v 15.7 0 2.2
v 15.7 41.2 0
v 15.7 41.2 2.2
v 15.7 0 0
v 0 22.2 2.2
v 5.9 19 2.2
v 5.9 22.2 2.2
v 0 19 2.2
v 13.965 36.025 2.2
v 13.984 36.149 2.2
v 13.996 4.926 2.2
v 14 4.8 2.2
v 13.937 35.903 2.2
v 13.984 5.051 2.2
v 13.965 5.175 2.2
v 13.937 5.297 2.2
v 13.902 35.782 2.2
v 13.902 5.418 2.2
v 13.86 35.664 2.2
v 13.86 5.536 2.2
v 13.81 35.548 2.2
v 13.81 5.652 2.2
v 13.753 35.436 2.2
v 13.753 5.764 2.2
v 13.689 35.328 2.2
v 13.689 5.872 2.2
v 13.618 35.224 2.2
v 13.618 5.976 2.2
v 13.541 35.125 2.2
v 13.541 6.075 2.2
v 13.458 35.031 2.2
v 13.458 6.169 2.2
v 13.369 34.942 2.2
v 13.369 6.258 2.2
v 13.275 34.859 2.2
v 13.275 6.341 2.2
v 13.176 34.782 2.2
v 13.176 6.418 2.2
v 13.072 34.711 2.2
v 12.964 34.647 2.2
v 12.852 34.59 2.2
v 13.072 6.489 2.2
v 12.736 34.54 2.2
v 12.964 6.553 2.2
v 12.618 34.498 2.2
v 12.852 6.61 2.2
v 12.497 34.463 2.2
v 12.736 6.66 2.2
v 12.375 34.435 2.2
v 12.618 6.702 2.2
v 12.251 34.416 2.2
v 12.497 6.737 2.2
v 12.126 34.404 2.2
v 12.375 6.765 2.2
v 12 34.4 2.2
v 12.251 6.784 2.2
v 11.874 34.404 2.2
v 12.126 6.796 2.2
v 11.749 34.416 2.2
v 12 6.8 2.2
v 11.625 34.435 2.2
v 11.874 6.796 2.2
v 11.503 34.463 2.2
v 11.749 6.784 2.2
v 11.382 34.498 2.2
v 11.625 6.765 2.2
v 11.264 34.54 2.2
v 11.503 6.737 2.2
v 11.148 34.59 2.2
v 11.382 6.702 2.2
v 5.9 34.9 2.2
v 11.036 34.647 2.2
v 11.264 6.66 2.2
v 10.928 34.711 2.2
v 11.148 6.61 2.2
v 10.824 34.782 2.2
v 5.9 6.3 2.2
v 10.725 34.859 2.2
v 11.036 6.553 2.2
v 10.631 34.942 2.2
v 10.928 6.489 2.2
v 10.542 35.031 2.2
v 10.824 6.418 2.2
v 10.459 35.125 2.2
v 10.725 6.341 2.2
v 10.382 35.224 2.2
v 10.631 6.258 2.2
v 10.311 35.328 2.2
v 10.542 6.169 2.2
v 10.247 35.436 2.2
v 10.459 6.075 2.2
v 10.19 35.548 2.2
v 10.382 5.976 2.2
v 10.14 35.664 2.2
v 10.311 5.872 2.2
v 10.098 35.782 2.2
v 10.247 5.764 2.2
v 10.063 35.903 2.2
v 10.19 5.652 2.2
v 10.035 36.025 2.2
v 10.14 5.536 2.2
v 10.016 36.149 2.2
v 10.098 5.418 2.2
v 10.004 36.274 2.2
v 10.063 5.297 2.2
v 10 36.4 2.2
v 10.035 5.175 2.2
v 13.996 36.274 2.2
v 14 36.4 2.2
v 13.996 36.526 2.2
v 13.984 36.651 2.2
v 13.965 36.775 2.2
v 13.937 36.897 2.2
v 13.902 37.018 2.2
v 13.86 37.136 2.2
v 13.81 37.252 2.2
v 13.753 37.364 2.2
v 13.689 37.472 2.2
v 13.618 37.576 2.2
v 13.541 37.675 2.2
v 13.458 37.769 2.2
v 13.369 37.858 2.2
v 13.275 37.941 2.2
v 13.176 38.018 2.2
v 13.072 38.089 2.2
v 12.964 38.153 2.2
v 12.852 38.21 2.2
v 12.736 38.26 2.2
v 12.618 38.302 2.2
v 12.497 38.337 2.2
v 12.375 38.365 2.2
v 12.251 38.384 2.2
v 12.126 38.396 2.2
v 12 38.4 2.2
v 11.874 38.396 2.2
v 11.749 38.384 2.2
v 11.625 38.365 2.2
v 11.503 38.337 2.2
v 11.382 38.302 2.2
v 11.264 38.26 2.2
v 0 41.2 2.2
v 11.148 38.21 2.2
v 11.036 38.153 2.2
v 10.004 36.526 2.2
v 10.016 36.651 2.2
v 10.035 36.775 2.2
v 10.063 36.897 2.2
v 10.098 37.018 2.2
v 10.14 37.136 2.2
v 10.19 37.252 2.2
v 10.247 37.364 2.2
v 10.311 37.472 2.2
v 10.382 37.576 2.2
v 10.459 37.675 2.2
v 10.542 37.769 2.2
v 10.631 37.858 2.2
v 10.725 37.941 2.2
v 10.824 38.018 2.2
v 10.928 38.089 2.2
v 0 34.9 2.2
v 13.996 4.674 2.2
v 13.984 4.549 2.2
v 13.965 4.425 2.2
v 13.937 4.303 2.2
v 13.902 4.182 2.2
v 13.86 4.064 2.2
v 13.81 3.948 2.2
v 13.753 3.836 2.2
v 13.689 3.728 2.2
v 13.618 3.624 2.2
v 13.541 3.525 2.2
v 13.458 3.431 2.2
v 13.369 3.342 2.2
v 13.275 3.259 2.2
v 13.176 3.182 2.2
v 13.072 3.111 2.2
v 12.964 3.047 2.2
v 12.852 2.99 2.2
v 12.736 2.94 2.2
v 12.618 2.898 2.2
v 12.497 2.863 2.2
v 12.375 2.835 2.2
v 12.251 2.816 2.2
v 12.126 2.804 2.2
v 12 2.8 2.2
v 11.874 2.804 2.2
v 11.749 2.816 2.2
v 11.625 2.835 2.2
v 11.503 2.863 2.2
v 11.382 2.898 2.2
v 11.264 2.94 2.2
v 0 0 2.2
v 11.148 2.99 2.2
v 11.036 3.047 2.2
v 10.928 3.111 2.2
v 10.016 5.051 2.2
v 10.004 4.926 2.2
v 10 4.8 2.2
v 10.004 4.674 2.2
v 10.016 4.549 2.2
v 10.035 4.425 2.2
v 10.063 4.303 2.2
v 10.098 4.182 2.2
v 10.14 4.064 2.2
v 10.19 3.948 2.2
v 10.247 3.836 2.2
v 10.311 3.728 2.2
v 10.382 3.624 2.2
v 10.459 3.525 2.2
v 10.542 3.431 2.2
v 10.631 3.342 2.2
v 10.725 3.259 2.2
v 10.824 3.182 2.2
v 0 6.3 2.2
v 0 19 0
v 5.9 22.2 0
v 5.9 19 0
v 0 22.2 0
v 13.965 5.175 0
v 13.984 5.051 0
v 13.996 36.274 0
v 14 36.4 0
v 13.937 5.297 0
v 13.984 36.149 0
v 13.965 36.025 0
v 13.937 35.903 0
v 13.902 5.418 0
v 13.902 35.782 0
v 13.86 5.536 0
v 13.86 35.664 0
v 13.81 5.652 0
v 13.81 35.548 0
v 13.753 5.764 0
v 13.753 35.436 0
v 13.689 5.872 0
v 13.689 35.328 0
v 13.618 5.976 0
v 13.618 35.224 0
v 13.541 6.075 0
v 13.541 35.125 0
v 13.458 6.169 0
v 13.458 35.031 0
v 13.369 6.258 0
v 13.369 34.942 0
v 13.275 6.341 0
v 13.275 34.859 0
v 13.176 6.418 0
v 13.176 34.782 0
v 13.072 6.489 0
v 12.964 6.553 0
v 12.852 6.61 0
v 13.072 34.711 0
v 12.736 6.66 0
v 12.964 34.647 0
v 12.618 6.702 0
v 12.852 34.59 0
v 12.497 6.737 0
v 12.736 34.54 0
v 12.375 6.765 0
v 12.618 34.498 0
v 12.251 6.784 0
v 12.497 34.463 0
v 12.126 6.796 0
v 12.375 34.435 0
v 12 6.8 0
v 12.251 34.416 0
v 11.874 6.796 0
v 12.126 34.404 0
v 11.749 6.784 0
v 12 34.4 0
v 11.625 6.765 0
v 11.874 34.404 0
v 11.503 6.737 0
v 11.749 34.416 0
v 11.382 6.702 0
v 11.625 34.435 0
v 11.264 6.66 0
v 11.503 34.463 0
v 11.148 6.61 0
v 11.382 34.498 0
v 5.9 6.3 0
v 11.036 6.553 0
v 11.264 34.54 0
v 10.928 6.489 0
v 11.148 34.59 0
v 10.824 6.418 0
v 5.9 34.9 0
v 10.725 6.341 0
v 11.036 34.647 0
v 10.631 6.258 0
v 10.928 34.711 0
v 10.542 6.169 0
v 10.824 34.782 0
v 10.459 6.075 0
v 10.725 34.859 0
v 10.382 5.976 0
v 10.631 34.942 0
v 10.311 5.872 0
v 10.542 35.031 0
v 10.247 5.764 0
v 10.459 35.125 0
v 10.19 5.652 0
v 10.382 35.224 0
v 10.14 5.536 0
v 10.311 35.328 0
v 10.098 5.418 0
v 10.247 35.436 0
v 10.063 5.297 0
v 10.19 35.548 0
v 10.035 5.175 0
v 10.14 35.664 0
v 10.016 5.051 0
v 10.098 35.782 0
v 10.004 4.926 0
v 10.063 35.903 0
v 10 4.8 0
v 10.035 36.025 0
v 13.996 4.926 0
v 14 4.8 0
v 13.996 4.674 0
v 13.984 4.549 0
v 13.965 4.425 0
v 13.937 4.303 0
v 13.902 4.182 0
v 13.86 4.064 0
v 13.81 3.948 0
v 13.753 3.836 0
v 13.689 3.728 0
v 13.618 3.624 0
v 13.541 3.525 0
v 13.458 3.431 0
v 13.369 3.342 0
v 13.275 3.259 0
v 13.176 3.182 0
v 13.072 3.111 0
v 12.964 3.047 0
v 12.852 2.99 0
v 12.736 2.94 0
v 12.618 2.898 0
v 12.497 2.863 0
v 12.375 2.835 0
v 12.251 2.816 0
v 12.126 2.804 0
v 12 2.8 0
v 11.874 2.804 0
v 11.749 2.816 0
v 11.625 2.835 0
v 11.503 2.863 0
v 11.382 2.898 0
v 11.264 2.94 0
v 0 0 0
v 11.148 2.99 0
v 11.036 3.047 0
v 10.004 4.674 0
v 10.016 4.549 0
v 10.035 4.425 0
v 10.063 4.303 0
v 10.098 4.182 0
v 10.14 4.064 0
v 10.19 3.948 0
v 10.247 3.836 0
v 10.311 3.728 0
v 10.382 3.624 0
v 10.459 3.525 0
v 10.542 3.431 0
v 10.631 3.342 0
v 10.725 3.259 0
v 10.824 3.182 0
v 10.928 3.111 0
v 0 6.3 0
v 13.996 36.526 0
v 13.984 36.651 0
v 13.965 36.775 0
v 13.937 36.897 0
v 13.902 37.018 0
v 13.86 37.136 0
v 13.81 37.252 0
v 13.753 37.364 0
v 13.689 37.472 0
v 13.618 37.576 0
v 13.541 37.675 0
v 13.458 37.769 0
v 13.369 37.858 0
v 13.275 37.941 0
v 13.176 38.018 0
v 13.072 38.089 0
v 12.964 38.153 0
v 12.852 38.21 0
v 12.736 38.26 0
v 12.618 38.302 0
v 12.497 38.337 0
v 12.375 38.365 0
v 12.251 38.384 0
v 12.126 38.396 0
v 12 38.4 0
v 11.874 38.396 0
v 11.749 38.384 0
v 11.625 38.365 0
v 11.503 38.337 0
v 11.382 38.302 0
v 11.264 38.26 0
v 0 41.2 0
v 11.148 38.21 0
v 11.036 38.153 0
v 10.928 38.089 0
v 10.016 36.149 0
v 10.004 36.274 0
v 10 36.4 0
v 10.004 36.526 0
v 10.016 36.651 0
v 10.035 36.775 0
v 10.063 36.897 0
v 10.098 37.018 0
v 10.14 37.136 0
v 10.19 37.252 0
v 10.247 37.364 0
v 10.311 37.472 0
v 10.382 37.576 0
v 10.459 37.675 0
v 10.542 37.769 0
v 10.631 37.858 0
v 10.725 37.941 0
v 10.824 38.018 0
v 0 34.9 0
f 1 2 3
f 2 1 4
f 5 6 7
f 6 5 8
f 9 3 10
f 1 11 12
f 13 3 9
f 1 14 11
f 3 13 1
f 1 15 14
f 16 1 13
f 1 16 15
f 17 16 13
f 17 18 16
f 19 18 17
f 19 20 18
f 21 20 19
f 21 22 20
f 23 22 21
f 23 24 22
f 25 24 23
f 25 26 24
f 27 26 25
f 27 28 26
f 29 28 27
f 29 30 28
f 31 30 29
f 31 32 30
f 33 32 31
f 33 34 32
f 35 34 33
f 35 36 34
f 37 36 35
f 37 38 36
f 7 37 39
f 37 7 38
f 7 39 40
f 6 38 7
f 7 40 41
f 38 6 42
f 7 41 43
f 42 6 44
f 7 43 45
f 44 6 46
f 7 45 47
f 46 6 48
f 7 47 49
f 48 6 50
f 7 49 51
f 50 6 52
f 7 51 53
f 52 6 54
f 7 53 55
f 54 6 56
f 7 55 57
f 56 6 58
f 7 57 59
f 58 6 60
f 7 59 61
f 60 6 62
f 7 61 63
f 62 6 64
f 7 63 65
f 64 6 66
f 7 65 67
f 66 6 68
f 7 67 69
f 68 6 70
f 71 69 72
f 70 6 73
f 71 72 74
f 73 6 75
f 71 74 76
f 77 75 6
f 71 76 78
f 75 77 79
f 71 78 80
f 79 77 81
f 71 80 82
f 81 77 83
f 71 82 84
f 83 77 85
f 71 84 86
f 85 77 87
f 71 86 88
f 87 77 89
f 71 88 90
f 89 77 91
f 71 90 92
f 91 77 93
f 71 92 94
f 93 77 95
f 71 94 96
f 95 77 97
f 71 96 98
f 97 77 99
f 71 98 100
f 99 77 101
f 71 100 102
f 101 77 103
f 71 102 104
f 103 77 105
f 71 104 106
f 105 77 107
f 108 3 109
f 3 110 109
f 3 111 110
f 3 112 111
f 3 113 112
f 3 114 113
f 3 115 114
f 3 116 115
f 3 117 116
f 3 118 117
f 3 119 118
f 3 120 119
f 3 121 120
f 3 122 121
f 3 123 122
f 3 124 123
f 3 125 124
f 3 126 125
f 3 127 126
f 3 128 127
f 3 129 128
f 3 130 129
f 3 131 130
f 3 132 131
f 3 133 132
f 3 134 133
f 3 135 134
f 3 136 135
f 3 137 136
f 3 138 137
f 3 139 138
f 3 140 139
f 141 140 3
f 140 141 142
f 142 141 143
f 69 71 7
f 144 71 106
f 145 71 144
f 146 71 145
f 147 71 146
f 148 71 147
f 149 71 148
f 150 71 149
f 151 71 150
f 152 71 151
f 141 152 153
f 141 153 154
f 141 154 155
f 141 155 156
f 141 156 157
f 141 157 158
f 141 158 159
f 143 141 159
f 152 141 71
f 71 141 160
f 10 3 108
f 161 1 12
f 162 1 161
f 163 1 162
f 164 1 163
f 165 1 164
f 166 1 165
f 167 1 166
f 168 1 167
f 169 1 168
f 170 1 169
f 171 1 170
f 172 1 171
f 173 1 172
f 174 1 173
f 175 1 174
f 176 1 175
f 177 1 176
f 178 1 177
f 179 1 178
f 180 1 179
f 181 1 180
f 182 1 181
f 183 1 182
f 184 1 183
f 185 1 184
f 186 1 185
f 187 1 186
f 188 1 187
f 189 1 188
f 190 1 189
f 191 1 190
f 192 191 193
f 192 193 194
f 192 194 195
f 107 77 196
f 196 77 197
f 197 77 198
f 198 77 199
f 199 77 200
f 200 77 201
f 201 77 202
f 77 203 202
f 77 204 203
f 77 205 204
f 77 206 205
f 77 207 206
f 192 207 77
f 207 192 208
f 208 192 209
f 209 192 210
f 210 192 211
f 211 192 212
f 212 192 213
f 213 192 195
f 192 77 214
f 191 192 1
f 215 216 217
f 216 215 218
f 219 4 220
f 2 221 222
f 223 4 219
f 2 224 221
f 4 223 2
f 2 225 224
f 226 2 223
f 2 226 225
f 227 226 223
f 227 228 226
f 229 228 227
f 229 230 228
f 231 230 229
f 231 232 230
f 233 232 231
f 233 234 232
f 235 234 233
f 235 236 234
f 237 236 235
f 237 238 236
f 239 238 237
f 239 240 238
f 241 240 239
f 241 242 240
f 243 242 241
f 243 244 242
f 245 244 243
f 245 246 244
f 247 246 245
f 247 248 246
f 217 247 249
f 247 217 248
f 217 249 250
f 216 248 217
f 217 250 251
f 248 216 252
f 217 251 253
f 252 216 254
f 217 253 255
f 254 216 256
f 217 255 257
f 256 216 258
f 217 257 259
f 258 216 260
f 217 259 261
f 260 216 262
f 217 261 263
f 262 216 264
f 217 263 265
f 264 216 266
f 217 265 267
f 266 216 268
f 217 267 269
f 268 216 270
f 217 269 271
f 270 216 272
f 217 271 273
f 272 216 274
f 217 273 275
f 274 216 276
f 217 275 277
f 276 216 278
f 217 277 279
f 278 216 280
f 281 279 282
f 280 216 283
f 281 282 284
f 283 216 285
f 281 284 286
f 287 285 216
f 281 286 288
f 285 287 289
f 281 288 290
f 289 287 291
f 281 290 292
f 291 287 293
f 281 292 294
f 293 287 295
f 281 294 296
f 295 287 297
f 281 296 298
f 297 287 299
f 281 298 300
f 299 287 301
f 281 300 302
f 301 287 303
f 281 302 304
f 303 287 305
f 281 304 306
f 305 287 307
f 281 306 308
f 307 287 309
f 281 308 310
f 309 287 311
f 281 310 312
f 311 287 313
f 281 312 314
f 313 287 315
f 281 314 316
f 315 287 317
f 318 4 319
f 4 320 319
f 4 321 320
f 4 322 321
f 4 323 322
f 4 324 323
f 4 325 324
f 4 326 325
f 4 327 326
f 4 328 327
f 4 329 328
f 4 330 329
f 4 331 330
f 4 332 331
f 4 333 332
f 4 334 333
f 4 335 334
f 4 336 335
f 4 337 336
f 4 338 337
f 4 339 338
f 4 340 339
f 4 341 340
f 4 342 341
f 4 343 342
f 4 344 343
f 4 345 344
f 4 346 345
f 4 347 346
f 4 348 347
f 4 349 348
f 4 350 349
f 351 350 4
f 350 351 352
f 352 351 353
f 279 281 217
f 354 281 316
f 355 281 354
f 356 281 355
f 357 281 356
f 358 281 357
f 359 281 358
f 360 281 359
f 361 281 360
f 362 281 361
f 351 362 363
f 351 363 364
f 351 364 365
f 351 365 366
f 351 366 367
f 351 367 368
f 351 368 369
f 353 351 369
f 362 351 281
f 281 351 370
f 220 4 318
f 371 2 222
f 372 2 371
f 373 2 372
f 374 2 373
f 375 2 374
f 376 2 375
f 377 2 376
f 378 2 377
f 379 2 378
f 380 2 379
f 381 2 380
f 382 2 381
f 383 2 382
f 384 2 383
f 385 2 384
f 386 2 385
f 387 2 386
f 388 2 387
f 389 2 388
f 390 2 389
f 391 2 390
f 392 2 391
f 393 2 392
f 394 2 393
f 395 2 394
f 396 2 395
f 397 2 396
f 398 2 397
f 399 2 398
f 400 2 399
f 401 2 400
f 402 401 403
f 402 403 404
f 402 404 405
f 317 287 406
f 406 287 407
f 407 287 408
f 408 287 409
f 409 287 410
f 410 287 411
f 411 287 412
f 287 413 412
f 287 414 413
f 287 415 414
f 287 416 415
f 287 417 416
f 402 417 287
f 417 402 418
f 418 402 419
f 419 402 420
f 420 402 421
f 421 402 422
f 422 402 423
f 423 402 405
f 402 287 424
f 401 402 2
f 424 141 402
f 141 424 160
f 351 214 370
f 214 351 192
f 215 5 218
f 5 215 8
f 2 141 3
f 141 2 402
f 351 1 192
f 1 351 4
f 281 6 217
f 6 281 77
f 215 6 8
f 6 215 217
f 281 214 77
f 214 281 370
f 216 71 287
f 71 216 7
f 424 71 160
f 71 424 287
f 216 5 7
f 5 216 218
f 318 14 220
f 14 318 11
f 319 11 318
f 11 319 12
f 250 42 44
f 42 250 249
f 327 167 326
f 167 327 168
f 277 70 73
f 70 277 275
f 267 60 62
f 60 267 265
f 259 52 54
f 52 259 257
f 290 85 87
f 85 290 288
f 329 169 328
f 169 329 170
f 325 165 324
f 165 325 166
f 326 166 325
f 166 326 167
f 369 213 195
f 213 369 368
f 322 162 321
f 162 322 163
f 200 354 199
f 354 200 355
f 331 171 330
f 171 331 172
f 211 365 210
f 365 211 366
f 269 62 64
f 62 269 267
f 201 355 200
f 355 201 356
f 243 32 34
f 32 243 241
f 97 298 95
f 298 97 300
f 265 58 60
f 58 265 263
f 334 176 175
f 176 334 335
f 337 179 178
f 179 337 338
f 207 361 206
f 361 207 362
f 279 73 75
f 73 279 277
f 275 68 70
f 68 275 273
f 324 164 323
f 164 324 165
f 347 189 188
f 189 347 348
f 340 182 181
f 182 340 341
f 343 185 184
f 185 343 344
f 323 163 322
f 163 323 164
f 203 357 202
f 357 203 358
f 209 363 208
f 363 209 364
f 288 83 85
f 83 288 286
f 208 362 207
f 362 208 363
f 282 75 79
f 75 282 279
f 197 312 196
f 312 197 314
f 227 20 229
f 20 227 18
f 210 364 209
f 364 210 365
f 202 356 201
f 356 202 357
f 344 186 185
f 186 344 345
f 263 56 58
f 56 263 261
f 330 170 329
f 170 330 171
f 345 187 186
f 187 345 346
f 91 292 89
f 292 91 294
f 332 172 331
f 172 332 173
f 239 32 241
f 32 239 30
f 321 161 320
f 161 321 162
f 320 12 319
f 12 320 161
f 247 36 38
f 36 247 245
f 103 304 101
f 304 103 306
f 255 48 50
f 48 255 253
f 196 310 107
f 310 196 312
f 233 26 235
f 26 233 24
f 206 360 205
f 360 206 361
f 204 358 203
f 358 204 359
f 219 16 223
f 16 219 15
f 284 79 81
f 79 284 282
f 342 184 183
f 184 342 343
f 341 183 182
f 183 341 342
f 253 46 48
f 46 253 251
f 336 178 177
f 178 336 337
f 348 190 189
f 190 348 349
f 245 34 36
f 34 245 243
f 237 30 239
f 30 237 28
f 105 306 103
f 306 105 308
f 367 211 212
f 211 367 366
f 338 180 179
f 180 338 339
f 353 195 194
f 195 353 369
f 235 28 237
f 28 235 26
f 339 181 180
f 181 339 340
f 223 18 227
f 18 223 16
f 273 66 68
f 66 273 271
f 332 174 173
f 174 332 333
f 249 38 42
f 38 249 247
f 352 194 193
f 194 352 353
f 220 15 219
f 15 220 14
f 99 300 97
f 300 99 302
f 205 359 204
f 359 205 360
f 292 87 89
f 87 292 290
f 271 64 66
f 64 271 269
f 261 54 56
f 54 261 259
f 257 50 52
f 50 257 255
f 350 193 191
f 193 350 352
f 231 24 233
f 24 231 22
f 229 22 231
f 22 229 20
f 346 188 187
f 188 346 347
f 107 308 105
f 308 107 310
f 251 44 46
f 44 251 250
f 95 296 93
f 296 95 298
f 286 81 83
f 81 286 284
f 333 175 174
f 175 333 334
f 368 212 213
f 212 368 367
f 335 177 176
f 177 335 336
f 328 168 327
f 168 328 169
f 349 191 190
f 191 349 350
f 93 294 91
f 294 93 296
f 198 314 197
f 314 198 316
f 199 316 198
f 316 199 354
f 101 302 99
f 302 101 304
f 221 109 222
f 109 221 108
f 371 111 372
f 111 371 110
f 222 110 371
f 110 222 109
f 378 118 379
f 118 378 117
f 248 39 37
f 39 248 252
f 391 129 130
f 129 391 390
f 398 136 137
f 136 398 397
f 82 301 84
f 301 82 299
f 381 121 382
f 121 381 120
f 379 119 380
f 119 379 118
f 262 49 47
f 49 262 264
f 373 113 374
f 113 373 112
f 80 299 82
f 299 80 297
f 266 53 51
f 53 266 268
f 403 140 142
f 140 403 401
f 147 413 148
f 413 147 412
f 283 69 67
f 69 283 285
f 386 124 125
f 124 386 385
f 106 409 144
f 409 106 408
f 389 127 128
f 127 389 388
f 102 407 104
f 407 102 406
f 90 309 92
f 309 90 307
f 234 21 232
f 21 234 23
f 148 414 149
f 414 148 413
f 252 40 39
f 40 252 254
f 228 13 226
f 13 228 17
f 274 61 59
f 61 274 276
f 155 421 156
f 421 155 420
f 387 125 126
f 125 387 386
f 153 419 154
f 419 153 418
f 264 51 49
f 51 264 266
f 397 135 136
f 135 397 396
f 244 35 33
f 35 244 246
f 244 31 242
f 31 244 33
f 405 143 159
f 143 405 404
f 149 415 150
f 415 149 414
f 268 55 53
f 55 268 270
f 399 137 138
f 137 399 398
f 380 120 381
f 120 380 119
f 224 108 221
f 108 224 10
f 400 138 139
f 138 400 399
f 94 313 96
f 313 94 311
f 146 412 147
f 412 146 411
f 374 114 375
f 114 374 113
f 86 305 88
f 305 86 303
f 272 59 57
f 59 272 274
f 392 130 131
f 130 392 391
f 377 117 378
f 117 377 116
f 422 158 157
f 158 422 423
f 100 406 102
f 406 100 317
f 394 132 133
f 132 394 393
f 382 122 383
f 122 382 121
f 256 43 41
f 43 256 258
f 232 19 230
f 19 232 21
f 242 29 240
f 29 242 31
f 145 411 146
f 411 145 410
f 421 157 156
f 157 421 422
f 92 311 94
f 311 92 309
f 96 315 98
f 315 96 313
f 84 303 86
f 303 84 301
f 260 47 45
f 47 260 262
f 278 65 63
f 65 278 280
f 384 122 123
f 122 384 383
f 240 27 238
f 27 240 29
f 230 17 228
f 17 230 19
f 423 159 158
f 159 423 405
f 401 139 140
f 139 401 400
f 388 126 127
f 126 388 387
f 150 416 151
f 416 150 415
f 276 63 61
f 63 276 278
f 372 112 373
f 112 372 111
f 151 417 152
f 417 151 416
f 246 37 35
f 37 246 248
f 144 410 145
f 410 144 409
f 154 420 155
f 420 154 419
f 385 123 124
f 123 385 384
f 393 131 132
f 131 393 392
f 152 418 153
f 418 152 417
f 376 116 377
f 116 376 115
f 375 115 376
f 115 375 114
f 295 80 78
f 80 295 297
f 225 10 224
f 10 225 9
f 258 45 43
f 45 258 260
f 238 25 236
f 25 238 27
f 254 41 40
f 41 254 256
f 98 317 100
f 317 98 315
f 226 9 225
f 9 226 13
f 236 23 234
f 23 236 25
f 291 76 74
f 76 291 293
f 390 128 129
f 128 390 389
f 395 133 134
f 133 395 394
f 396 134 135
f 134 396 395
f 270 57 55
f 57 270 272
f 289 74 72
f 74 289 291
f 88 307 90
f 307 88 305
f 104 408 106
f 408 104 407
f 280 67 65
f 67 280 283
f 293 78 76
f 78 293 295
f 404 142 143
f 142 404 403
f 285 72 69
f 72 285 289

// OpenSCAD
module single() {
	difference() {
		cube(size = [15.7,41.2,2.2], center = false);
		translate(v = [-0.5,6.3,-0.5])
			cube(size = [6.4,12.7,4]);
		translate(v = [-0.5,22.2,-0.5])
			cube(size = [6.4,12.7,4]);
		translate(v=[12,4.8,1])
			cylinder(h=3,r=2, center=true, $fn=100);
		translate(v=[12,36.4,1])
			cylinder(h=3,r=2, center=true, $fn=100);
	}
}

single();
